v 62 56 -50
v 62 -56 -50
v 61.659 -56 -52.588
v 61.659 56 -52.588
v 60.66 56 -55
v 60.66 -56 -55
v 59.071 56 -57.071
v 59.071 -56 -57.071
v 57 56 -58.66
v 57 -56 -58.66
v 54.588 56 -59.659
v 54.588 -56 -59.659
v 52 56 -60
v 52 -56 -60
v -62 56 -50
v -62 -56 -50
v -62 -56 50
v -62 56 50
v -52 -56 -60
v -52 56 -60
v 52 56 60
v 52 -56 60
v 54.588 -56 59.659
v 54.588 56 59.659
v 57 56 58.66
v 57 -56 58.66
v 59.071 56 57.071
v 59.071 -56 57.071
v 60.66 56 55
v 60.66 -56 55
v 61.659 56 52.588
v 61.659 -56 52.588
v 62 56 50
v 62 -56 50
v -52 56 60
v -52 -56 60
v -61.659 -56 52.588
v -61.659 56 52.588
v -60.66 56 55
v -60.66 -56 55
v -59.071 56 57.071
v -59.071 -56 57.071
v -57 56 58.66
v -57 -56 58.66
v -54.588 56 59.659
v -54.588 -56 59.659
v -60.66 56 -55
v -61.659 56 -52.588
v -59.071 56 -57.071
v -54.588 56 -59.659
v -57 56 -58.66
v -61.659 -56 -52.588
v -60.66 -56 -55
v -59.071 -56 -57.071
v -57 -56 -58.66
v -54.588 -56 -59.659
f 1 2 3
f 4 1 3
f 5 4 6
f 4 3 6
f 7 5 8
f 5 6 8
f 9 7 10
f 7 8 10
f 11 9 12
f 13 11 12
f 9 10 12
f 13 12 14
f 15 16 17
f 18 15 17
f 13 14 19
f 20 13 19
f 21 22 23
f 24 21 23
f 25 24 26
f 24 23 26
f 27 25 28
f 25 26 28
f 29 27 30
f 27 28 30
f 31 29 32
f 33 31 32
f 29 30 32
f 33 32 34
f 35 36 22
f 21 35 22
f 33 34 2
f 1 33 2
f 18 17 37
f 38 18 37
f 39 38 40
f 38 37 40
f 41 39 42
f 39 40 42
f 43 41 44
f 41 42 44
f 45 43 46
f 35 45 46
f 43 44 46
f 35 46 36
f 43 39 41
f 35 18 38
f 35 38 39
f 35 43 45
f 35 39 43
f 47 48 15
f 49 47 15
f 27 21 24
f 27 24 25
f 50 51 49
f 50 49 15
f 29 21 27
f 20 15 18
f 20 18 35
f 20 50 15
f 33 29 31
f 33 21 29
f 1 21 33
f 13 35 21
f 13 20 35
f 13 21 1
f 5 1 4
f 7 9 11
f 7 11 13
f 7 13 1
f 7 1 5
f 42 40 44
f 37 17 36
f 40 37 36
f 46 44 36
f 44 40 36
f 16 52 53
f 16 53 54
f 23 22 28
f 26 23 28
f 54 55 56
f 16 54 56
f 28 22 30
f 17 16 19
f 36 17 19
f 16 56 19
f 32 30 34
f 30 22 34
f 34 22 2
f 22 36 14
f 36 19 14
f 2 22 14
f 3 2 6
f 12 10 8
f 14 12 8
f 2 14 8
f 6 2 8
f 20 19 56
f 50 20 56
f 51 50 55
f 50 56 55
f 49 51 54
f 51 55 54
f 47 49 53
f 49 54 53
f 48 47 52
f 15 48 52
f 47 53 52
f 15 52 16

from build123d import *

# Parameters (mm, degrees)
BOSS_EXTRUDE1_DEPTH      = 56
BOSS_EXTRUDE1_DEPTH_BACK = 56


with BuildPart() as part:
    # Sketch1 → Boss-Extrude1 (new, two sides: drawn at the far end of the back side and taken through both)
    with BuildSketch(Plane(origin=(0, 0, 0), x_dir=(1, 0, 0), z_dir=(0, 1, 0)).offset(-BOSS_EXTRUDE1_DEPTH_BACK)):
        with BuildLine():
            Line((-52, -60), (52, -60))
            ThreePointArc((52, -60), (59.071067812, -57.071067812), (62, -50))
            Line((62, -50), (62, 50))
            ThreePointArc((62, 50), (59.071067812, 57.071067812), (52, 60))
            Line((52, 60), (-52, 60))
            ThreePointArc((-52, 60), (-59.071067812, 57.071067812), (-62, 50))
            Line((-62, 50), (-62, -50))
            ThreePointArc((-62, -50), (-59.071067812, -57.071067812), (-52, -60))
        make_face()
    extrude(amount=BOSS_EXTRUDE1_DEPTH + BOSS_EXTRUDE1_DEPTH_BACK)


solid = part.part
